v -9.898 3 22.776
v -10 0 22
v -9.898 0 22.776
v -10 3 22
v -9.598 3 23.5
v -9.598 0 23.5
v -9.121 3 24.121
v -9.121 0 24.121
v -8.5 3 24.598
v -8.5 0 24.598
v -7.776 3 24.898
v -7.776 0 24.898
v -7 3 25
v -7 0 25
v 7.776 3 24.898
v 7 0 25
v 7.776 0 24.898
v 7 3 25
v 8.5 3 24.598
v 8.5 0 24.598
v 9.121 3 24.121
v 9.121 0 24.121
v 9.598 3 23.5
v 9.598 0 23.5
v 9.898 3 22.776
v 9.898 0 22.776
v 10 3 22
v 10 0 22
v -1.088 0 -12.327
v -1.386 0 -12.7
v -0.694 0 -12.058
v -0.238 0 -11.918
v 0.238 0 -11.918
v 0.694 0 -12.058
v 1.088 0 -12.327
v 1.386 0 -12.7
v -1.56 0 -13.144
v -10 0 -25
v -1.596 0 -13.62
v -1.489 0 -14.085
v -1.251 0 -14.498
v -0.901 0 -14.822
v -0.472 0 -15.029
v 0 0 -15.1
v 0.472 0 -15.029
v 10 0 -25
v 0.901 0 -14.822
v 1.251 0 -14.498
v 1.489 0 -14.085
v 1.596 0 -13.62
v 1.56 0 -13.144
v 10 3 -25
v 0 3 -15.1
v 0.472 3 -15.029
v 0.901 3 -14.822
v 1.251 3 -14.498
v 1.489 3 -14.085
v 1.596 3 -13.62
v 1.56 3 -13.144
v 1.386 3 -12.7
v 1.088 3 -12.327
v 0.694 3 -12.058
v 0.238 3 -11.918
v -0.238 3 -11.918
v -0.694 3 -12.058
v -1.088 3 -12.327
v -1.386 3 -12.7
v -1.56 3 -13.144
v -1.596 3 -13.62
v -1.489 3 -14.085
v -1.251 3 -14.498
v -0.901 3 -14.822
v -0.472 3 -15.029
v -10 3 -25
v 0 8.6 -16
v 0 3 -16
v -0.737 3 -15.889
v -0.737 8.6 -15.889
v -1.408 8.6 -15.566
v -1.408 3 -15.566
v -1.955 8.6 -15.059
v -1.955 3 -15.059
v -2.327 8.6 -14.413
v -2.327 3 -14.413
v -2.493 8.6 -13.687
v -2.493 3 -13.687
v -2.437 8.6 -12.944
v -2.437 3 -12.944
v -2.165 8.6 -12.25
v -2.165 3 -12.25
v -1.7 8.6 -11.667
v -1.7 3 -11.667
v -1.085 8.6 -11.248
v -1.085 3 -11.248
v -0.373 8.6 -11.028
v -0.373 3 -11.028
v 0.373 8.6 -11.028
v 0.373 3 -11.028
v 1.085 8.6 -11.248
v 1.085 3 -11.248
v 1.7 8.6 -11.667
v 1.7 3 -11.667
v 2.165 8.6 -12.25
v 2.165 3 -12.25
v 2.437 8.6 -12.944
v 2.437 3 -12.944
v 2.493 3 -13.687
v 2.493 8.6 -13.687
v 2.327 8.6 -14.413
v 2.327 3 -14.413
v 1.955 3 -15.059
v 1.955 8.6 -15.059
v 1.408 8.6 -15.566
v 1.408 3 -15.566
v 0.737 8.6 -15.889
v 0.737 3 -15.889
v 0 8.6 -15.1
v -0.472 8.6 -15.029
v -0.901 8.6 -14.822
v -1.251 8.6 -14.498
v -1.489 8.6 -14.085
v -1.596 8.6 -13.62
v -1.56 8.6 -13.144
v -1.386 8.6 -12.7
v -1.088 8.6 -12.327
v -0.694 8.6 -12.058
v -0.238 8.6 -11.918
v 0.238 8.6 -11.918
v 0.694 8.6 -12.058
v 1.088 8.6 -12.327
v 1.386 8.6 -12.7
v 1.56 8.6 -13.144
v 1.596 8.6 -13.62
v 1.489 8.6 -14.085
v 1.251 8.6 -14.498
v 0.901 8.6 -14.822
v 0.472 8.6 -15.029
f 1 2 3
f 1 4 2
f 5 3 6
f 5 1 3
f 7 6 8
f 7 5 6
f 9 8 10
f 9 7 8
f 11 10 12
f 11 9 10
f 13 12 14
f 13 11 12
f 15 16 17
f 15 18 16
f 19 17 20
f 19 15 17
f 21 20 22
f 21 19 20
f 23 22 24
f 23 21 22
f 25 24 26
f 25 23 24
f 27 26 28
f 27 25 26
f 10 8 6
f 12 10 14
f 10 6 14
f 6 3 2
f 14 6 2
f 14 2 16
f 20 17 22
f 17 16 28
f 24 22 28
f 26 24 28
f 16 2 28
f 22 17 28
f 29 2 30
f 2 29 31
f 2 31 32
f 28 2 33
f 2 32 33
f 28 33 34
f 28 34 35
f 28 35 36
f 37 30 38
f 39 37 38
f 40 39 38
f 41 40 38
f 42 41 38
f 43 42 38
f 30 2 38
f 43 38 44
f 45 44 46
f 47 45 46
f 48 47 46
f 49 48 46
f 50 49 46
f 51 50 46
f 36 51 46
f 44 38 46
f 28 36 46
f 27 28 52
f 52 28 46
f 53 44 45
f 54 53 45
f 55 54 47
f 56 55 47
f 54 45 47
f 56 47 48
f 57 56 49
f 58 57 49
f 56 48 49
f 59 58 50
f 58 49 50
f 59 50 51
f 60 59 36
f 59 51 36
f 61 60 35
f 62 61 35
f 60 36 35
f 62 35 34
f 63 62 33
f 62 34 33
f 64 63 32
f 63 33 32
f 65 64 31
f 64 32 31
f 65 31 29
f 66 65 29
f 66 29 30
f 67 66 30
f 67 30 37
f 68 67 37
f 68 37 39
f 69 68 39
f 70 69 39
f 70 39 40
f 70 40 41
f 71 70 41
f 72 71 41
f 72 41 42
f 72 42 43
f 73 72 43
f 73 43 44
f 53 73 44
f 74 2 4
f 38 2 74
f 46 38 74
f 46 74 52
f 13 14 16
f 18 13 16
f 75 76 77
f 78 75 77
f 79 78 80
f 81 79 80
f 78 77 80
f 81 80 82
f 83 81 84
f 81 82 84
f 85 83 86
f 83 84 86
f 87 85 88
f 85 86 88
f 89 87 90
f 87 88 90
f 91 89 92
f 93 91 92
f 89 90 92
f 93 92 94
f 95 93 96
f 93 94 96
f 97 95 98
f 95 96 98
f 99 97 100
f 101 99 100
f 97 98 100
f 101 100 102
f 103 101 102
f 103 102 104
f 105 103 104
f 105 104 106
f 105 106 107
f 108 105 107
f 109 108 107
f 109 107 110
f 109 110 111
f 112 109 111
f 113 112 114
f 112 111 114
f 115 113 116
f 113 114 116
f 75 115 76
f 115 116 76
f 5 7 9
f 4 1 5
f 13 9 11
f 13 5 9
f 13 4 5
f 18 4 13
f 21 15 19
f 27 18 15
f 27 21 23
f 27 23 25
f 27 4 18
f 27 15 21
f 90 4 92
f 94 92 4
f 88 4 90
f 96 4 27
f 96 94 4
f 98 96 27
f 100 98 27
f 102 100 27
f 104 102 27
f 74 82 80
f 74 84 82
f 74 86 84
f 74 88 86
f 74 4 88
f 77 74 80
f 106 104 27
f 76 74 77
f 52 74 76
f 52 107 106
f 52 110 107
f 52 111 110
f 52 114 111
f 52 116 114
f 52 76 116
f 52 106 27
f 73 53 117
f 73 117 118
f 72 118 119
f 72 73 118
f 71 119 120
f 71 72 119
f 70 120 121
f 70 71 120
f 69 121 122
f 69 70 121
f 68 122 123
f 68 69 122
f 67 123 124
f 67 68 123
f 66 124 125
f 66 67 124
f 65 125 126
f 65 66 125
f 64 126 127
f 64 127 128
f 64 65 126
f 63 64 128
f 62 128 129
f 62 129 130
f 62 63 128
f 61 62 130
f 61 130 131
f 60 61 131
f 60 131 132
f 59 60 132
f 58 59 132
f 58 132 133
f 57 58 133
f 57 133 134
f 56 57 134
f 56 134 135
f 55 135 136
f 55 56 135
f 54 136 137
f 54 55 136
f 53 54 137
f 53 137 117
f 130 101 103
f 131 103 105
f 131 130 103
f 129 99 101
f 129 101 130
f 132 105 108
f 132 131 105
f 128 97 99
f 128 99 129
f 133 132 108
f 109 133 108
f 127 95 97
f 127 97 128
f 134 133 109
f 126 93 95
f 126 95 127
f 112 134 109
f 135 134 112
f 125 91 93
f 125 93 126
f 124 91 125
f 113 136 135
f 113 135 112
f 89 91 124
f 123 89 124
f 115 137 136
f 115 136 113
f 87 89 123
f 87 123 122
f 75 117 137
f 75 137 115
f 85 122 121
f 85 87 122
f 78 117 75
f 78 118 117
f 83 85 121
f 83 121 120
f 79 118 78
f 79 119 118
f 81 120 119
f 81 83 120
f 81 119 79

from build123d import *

# Parameters (mm, degrees)
SKETCH1_W           = 20
SKETCH1_H           = 50
BOSS_EXTRUDE1_DEPTH = 3
SKETCH3_R           = 1.6
CUT_EXTRUDE1_DEPTH  = 10
SKETCH4_R           = 2.5
SKETCH4_R_2         = 1.599999999
BOSS_EXTRUDE4_DEPTH = 5.6
FILLET1_R           = 3


with BuildPart() as part:
    # Sketch1 → Boss-Extrude1 (new body)
    with BuildSketch(Plane(origin=(0, 0, 0), x_dir=(1, 0, 0), z_dir=(0, 1, 0))):
        Rectangle(SKETCH1_W, SKETCH1_H)
    extrude(amount=BOSS_EXTRUDE1_DEPTH)

    # Sketch3 → Cut-Extrude1 (cut)
    with BuildSketch(Plane.XZ):
        with Locations(Location((0, -13.5, 0), (0, 0, 270))):
            Circle(SKETCH3_R)
    extrude(amount=-CUT_EXTRUDE1_DEPTH, mode=Mode.SUBTRACT)

    # Sketch4 → Boss-Extrude4 (add)
    with BuildSketch(Plane(origin=(0, 3, 0), x_dir=(1, 0, 0), z_dir=(0, 1, 0))):
        with Locations(Location((1e-09, 13.5, 0), (0, 0, 90))):
            Circle(SKETCH4_R)
        with Locations(Location((1e-09, 13.5, 0), (0, 0, 90.000000022))):
            Circle(SKETCH4_R_2, mode=Mode.SUBTRACT)
    extrude(amount=BOSS_EXTRUDE4_DEPTH)

    # Fillet1
    fillet1_edges = [part.edges().sort_by_distance(p)[0] for p in [
        (10, 1.5, 25),
        (-10, 1.5, 25),
    ]]
    fillet(fillet1_edges, radius=FILLET1_R)


solid = part.part
